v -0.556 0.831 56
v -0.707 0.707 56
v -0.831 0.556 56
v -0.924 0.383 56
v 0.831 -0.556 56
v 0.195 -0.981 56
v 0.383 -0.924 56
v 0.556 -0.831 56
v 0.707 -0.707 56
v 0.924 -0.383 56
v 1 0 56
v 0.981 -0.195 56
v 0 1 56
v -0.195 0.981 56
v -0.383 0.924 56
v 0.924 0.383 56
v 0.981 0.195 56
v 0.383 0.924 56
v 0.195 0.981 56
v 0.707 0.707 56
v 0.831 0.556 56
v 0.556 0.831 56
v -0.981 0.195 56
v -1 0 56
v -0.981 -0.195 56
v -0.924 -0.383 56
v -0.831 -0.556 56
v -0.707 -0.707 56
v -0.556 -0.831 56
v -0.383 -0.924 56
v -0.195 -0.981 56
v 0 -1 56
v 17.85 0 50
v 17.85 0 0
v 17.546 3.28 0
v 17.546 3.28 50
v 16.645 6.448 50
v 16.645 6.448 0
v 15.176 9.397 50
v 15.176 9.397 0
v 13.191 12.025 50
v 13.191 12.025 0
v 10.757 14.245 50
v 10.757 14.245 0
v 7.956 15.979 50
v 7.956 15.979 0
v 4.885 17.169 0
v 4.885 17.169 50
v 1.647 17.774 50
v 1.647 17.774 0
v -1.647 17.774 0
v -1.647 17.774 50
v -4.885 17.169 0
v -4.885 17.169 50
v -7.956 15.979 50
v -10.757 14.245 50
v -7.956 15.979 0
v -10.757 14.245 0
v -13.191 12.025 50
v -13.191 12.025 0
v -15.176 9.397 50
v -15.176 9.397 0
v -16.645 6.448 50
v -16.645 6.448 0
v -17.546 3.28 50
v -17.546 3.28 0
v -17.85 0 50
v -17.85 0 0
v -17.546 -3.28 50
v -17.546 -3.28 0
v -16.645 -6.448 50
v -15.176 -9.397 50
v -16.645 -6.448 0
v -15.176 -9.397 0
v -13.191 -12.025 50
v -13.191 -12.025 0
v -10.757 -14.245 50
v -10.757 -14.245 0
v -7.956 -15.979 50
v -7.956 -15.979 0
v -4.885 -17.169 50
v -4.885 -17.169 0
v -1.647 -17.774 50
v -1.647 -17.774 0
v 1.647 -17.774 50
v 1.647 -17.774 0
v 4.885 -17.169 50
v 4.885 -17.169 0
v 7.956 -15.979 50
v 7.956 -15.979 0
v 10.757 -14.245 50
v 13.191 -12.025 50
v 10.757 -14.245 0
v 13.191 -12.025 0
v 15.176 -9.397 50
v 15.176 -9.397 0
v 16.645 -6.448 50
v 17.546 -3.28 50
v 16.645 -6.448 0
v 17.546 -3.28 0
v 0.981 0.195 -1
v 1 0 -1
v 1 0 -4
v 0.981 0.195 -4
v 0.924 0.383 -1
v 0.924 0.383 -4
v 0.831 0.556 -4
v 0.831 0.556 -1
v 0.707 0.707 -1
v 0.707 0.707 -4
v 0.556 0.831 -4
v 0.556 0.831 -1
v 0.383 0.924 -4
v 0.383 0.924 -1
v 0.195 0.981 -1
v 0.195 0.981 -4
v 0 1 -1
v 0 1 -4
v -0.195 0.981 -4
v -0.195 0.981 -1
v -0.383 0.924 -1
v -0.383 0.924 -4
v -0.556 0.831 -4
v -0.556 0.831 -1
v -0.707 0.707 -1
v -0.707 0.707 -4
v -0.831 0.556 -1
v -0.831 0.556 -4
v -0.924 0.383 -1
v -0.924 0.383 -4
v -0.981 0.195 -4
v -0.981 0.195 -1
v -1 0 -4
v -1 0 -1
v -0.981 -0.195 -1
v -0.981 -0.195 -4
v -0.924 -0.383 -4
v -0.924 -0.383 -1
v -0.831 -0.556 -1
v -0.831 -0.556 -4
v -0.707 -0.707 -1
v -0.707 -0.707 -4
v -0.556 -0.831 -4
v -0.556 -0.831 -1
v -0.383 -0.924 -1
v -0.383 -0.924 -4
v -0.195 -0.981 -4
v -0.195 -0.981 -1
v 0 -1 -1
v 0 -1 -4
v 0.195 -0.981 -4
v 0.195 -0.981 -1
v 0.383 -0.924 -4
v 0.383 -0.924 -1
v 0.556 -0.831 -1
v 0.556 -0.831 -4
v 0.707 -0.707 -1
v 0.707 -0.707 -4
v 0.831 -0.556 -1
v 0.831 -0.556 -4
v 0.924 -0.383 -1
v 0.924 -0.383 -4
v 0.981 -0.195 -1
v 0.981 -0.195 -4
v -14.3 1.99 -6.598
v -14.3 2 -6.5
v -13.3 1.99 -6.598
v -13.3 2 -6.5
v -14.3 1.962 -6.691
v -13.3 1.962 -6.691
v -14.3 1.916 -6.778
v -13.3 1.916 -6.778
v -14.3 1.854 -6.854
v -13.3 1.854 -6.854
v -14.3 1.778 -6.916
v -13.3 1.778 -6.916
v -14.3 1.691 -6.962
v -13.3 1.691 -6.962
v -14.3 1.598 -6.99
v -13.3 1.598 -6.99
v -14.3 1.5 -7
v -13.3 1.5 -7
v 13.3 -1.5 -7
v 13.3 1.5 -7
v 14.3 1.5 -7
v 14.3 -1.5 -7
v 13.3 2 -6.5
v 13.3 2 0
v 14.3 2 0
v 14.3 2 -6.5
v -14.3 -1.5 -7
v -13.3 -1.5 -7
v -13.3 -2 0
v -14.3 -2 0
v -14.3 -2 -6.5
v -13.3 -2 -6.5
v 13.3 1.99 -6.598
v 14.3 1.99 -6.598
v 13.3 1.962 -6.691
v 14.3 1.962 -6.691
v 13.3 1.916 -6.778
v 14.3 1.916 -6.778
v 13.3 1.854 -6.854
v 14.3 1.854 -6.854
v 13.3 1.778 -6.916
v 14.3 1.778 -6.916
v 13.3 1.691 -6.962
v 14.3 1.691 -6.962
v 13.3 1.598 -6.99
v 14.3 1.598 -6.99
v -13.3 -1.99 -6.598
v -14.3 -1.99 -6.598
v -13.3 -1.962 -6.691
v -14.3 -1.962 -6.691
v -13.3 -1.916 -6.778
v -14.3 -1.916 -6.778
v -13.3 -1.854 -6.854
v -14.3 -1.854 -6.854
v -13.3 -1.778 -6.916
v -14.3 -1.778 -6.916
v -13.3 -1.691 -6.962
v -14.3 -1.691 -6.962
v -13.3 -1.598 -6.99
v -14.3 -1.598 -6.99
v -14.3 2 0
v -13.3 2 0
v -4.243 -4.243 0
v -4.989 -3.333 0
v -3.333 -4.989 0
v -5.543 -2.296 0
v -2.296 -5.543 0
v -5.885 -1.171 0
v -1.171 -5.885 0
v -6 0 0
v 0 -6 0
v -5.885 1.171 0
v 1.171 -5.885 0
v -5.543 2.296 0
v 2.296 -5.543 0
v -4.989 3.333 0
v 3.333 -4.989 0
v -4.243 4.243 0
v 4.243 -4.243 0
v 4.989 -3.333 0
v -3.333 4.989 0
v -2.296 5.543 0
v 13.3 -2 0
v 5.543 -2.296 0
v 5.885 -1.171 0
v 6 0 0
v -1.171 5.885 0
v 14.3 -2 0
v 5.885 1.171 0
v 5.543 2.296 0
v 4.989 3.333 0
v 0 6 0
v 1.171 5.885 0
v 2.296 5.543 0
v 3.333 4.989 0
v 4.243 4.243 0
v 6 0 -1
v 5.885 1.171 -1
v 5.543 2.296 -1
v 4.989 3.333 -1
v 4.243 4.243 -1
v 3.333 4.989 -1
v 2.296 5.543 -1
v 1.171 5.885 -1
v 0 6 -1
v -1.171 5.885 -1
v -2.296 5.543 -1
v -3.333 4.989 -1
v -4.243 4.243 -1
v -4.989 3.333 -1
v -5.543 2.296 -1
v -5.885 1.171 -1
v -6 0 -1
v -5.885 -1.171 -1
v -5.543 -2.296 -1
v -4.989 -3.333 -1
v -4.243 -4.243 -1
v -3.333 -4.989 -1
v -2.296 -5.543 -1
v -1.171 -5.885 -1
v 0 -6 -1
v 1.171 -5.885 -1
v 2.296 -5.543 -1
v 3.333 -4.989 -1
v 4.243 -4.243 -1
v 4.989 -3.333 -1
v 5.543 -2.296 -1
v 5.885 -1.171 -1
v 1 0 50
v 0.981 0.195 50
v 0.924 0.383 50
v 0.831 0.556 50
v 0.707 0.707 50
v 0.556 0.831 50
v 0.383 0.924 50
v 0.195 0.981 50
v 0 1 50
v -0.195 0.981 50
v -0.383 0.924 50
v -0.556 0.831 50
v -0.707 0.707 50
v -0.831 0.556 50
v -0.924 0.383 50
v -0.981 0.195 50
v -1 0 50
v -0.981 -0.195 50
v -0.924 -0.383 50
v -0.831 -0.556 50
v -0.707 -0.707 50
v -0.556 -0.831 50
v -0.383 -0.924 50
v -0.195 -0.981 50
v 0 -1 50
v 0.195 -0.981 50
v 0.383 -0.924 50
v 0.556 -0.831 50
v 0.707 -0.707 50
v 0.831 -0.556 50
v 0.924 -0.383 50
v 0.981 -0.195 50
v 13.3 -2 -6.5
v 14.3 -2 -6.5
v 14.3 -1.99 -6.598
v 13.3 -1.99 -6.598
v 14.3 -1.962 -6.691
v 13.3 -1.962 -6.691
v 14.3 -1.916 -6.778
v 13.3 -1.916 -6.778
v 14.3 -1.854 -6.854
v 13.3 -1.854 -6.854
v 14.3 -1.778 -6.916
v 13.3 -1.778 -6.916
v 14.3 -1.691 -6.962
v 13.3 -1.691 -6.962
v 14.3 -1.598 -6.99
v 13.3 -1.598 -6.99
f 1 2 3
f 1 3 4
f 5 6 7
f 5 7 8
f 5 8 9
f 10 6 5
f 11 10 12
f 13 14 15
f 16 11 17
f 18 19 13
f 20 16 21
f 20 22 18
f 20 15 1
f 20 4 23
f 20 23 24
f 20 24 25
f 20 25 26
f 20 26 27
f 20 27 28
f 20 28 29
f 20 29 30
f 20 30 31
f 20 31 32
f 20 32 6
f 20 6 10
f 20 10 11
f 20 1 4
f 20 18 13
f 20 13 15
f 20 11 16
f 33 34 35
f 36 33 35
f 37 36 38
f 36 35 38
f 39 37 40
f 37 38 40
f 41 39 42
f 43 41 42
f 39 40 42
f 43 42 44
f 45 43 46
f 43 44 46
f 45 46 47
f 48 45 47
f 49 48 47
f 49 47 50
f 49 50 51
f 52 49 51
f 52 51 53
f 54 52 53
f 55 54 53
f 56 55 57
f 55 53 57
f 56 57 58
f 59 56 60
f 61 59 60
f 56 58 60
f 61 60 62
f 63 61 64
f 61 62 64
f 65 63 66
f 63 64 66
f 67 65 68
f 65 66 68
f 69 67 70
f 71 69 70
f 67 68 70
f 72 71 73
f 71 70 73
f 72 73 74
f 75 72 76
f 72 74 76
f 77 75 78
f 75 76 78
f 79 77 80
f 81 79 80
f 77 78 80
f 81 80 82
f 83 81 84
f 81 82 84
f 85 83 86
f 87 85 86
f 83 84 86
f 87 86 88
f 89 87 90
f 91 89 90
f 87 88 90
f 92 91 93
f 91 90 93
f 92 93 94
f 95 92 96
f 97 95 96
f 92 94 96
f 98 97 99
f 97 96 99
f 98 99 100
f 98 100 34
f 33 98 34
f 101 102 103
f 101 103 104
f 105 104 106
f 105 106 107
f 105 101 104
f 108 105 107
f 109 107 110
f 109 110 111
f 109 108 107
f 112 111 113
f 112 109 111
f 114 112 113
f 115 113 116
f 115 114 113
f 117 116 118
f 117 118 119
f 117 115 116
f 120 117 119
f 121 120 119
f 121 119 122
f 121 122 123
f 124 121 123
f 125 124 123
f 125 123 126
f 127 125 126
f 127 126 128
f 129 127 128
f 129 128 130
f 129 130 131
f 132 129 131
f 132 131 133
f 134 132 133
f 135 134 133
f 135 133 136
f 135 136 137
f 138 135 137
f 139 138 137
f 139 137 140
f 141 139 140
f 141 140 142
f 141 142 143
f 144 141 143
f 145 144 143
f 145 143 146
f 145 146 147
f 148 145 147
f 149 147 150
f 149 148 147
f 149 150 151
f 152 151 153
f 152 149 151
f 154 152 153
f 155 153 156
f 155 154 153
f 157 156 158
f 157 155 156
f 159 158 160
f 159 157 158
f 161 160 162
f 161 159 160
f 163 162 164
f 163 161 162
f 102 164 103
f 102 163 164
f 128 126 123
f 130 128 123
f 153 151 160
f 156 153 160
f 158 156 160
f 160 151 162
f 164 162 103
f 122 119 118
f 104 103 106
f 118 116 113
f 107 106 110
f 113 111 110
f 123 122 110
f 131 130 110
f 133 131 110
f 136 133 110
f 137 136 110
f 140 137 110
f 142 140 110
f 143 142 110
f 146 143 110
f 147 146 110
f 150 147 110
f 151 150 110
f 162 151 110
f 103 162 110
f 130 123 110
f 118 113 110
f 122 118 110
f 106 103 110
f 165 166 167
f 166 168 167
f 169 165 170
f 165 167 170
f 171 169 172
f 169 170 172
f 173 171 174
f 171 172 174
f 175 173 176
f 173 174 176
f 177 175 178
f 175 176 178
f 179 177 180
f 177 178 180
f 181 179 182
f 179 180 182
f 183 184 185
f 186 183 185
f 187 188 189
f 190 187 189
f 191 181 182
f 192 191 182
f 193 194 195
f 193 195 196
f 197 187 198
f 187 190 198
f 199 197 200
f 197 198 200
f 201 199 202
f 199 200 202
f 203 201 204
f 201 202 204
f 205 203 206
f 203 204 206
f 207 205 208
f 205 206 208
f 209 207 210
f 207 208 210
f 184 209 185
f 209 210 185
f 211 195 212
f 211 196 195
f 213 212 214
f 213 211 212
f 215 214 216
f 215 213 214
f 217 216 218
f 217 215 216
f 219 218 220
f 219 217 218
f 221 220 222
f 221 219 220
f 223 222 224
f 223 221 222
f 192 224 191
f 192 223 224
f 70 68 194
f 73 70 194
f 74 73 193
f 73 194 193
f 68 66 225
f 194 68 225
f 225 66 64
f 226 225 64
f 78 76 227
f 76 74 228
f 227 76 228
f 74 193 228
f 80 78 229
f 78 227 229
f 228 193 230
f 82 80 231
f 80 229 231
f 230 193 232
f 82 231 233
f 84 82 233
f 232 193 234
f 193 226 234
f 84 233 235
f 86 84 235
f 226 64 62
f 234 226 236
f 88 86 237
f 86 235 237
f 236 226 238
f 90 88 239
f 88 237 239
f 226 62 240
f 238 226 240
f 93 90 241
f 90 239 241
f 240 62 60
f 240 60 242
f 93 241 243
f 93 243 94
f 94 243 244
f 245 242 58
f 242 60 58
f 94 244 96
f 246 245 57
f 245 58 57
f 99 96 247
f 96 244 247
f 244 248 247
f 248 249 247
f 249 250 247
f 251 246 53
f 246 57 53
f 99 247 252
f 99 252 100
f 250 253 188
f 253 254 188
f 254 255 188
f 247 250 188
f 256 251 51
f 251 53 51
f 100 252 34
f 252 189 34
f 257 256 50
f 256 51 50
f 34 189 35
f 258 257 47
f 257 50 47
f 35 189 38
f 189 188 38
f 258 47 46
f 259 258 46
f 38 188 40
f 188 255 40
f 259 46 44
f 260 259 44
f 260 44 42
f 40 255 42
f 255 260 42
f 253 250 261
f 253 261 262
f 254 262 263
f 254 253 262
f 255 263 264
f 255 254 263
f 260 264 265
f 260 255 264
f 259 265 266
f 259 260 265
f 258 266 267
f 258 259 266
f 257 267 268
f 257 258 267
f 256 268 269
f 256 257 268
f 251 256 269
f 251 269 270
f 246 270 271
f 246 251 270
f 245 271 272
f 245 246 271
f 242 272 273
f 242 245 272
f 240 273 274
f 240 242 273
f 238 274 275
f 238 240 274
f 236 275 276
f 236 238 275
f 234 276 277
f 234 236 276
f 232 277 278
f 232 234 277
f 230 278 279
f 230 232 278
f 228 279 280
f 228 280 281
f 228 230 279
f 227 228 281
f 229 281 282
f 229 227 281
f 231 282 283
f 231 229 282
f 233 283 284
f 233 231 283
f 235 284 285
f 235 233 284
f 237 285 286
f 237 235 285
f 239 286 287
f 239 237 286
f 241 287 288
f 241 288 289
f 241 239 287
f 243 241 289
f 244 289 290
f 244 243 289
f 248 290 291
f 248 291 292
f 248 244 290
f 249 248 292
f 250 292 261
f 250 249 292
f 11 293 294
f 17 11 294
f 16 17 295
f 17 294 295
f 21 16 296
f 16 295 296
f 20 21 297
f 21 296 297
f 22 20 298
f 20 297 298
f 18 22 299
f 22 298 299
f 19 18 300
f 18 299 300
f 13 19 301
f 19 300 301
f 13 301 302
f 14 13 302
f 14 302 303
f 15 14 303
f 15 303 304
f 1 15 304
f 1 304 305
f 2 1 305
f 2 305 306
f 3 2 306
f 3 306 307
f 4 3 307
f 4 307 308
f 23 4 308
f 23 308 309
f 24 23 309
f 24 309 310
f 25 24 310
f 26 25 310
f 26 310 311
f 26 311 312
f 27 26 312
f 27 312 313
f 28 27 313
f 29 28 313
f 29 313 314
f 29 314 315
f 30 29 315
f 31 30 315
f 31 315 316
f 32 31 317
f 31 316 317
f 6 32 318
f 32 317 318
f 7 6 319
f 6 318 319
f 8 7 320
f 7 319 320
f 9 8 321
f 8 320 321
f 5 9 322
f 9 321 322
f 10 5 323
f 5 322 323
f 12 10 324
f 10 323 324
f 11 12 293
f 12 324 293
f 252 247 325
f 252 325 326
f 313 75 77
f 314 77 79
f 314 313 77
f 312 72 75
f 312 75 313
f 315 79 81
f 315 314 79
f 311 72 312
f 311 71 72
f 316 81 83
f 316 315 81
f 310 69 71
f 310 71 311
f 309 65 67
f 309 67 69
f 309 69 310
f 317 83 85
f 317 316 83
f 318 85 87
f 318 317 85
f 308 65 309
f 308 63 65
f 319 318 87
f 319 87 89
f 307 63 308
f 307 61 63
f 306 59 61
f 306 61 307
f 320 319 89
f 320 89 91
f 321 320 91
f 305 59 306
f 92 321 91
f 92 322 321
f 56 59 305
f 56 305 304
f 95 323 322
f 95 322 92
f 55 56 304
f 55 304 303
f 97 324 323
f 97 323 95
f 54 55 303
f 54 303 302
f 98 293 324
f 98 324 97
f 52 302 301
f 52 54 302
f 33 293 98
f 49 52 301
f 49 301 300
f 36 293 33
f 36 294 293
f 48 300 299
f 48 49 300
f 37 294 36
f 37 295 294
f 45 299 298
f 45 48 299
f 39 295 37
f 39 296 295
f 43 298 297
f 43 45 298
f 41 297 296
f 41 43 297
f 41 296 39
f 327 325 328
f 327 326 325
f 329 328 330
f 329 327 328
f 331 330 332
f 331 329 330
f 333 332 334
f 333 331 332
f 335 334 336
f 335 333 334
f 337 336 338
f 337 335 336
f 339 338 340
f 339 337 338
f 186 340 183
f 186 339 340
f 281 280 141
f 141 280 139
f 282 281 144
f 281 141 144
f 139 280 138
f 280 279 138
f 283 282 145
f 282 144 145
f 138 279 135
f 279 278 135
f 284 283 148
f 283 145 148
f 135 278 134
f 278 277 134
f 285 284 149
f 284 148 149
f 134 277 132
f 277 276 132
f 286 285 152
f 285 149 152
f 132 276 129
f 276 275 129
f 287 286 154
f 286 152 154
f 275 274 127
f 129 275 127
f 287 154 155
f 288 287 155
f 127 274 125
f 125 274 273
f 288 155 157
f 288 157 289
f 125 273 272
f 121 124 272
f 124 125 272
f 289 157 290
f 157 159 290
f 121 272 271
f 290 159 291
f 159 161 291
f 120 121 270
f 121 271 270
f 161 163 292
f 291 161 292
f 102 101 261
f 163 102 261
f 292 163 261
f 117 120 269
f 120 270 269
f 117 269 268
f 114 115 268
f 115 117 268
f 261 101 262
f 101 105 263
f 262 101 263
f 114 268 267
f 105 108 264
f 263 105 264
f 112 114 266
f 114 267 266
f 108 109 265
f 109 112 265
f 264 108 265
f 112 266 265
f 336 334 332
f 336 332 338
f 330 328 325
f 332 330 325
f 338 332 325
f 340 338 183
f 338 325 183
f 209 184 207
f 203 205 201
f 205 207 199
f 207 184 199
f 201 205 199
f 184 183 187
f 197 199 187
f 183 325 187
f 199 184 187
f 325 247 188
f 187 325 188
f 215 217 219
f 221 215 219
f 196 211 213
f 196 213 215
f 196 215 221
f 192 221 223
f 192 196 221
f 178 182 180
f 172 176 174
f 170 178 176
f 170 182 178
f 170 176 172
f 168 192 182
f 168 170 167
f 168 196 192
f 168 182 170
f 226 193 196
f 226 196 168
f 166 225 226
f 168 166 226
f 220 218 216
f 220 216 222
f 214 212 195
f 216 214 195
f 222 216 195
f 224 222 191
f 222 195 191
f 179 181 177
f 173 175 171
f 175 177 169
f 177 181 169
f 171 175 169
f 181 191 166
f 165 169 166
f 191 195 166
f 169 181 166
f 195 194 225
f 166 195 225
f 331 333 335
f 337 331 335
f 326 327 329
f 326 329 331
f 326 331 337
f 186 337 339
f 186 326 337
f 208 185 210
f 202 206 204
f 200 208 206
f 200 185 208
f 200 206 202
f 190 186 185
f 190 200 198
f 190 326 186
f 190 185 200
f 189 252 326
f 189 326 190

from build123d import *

# Parameters (mm, degrees)
F0_R          = 17.85
F1_DEPTH      = 50
F2_R          = 1
F3_DEPTH      = 4
F3_DEPTH_BACK = 56
F4_R          = 6
F5_DEPTH      = 1
F6_W          = 1
F6_H          = 4
F7_DEPTH      = 7
F8_R          = 0.5


with BuildPart() as f1:
    # F0 (on Top) → F1 (new body)
    with BuildSketch(Plane.XY):
        Circle(F0_R)
    extrude(amount=F1_DEPTH)

    # F2 (on Top) → F3 (join, two sides)
    with BuildSketch(Plane.XY) as f3_sk:
        Circle(F2_R)
    extrude(amount=-F3_DEPTH)
    extrude(f3_sk.sketch, amount=F3_DEPTH_BACK)

    # F4 (on Top) → F5 (join)
    with BuildSketch(Plane.XY):
        Circle(F4_R)
    extrude(amount=-F5_DEPTH)

    # F6 (on Top) → F7 (join)
    with BuildSketch(Plane.XY):
        with Locations((-13.8, 0)):
            Rectangle(F6_W, F6_H)
        with Locations((13.8, 0)):
            Rectangle(F6_W, F6_H)
    extrude(amount=-F7_DEPTH)

    # F8
    f8_edges = [f1.edges().sort_by_distance(p)[0] for p in [
        (13.8, -2, -7),
        (-13.8, -2, -7),
        (-13.8, 2, -7),
        (13.8, 2, -7),
    ]]
    fillet(f8_edges, radius=F8_R)


solid = f1.part
